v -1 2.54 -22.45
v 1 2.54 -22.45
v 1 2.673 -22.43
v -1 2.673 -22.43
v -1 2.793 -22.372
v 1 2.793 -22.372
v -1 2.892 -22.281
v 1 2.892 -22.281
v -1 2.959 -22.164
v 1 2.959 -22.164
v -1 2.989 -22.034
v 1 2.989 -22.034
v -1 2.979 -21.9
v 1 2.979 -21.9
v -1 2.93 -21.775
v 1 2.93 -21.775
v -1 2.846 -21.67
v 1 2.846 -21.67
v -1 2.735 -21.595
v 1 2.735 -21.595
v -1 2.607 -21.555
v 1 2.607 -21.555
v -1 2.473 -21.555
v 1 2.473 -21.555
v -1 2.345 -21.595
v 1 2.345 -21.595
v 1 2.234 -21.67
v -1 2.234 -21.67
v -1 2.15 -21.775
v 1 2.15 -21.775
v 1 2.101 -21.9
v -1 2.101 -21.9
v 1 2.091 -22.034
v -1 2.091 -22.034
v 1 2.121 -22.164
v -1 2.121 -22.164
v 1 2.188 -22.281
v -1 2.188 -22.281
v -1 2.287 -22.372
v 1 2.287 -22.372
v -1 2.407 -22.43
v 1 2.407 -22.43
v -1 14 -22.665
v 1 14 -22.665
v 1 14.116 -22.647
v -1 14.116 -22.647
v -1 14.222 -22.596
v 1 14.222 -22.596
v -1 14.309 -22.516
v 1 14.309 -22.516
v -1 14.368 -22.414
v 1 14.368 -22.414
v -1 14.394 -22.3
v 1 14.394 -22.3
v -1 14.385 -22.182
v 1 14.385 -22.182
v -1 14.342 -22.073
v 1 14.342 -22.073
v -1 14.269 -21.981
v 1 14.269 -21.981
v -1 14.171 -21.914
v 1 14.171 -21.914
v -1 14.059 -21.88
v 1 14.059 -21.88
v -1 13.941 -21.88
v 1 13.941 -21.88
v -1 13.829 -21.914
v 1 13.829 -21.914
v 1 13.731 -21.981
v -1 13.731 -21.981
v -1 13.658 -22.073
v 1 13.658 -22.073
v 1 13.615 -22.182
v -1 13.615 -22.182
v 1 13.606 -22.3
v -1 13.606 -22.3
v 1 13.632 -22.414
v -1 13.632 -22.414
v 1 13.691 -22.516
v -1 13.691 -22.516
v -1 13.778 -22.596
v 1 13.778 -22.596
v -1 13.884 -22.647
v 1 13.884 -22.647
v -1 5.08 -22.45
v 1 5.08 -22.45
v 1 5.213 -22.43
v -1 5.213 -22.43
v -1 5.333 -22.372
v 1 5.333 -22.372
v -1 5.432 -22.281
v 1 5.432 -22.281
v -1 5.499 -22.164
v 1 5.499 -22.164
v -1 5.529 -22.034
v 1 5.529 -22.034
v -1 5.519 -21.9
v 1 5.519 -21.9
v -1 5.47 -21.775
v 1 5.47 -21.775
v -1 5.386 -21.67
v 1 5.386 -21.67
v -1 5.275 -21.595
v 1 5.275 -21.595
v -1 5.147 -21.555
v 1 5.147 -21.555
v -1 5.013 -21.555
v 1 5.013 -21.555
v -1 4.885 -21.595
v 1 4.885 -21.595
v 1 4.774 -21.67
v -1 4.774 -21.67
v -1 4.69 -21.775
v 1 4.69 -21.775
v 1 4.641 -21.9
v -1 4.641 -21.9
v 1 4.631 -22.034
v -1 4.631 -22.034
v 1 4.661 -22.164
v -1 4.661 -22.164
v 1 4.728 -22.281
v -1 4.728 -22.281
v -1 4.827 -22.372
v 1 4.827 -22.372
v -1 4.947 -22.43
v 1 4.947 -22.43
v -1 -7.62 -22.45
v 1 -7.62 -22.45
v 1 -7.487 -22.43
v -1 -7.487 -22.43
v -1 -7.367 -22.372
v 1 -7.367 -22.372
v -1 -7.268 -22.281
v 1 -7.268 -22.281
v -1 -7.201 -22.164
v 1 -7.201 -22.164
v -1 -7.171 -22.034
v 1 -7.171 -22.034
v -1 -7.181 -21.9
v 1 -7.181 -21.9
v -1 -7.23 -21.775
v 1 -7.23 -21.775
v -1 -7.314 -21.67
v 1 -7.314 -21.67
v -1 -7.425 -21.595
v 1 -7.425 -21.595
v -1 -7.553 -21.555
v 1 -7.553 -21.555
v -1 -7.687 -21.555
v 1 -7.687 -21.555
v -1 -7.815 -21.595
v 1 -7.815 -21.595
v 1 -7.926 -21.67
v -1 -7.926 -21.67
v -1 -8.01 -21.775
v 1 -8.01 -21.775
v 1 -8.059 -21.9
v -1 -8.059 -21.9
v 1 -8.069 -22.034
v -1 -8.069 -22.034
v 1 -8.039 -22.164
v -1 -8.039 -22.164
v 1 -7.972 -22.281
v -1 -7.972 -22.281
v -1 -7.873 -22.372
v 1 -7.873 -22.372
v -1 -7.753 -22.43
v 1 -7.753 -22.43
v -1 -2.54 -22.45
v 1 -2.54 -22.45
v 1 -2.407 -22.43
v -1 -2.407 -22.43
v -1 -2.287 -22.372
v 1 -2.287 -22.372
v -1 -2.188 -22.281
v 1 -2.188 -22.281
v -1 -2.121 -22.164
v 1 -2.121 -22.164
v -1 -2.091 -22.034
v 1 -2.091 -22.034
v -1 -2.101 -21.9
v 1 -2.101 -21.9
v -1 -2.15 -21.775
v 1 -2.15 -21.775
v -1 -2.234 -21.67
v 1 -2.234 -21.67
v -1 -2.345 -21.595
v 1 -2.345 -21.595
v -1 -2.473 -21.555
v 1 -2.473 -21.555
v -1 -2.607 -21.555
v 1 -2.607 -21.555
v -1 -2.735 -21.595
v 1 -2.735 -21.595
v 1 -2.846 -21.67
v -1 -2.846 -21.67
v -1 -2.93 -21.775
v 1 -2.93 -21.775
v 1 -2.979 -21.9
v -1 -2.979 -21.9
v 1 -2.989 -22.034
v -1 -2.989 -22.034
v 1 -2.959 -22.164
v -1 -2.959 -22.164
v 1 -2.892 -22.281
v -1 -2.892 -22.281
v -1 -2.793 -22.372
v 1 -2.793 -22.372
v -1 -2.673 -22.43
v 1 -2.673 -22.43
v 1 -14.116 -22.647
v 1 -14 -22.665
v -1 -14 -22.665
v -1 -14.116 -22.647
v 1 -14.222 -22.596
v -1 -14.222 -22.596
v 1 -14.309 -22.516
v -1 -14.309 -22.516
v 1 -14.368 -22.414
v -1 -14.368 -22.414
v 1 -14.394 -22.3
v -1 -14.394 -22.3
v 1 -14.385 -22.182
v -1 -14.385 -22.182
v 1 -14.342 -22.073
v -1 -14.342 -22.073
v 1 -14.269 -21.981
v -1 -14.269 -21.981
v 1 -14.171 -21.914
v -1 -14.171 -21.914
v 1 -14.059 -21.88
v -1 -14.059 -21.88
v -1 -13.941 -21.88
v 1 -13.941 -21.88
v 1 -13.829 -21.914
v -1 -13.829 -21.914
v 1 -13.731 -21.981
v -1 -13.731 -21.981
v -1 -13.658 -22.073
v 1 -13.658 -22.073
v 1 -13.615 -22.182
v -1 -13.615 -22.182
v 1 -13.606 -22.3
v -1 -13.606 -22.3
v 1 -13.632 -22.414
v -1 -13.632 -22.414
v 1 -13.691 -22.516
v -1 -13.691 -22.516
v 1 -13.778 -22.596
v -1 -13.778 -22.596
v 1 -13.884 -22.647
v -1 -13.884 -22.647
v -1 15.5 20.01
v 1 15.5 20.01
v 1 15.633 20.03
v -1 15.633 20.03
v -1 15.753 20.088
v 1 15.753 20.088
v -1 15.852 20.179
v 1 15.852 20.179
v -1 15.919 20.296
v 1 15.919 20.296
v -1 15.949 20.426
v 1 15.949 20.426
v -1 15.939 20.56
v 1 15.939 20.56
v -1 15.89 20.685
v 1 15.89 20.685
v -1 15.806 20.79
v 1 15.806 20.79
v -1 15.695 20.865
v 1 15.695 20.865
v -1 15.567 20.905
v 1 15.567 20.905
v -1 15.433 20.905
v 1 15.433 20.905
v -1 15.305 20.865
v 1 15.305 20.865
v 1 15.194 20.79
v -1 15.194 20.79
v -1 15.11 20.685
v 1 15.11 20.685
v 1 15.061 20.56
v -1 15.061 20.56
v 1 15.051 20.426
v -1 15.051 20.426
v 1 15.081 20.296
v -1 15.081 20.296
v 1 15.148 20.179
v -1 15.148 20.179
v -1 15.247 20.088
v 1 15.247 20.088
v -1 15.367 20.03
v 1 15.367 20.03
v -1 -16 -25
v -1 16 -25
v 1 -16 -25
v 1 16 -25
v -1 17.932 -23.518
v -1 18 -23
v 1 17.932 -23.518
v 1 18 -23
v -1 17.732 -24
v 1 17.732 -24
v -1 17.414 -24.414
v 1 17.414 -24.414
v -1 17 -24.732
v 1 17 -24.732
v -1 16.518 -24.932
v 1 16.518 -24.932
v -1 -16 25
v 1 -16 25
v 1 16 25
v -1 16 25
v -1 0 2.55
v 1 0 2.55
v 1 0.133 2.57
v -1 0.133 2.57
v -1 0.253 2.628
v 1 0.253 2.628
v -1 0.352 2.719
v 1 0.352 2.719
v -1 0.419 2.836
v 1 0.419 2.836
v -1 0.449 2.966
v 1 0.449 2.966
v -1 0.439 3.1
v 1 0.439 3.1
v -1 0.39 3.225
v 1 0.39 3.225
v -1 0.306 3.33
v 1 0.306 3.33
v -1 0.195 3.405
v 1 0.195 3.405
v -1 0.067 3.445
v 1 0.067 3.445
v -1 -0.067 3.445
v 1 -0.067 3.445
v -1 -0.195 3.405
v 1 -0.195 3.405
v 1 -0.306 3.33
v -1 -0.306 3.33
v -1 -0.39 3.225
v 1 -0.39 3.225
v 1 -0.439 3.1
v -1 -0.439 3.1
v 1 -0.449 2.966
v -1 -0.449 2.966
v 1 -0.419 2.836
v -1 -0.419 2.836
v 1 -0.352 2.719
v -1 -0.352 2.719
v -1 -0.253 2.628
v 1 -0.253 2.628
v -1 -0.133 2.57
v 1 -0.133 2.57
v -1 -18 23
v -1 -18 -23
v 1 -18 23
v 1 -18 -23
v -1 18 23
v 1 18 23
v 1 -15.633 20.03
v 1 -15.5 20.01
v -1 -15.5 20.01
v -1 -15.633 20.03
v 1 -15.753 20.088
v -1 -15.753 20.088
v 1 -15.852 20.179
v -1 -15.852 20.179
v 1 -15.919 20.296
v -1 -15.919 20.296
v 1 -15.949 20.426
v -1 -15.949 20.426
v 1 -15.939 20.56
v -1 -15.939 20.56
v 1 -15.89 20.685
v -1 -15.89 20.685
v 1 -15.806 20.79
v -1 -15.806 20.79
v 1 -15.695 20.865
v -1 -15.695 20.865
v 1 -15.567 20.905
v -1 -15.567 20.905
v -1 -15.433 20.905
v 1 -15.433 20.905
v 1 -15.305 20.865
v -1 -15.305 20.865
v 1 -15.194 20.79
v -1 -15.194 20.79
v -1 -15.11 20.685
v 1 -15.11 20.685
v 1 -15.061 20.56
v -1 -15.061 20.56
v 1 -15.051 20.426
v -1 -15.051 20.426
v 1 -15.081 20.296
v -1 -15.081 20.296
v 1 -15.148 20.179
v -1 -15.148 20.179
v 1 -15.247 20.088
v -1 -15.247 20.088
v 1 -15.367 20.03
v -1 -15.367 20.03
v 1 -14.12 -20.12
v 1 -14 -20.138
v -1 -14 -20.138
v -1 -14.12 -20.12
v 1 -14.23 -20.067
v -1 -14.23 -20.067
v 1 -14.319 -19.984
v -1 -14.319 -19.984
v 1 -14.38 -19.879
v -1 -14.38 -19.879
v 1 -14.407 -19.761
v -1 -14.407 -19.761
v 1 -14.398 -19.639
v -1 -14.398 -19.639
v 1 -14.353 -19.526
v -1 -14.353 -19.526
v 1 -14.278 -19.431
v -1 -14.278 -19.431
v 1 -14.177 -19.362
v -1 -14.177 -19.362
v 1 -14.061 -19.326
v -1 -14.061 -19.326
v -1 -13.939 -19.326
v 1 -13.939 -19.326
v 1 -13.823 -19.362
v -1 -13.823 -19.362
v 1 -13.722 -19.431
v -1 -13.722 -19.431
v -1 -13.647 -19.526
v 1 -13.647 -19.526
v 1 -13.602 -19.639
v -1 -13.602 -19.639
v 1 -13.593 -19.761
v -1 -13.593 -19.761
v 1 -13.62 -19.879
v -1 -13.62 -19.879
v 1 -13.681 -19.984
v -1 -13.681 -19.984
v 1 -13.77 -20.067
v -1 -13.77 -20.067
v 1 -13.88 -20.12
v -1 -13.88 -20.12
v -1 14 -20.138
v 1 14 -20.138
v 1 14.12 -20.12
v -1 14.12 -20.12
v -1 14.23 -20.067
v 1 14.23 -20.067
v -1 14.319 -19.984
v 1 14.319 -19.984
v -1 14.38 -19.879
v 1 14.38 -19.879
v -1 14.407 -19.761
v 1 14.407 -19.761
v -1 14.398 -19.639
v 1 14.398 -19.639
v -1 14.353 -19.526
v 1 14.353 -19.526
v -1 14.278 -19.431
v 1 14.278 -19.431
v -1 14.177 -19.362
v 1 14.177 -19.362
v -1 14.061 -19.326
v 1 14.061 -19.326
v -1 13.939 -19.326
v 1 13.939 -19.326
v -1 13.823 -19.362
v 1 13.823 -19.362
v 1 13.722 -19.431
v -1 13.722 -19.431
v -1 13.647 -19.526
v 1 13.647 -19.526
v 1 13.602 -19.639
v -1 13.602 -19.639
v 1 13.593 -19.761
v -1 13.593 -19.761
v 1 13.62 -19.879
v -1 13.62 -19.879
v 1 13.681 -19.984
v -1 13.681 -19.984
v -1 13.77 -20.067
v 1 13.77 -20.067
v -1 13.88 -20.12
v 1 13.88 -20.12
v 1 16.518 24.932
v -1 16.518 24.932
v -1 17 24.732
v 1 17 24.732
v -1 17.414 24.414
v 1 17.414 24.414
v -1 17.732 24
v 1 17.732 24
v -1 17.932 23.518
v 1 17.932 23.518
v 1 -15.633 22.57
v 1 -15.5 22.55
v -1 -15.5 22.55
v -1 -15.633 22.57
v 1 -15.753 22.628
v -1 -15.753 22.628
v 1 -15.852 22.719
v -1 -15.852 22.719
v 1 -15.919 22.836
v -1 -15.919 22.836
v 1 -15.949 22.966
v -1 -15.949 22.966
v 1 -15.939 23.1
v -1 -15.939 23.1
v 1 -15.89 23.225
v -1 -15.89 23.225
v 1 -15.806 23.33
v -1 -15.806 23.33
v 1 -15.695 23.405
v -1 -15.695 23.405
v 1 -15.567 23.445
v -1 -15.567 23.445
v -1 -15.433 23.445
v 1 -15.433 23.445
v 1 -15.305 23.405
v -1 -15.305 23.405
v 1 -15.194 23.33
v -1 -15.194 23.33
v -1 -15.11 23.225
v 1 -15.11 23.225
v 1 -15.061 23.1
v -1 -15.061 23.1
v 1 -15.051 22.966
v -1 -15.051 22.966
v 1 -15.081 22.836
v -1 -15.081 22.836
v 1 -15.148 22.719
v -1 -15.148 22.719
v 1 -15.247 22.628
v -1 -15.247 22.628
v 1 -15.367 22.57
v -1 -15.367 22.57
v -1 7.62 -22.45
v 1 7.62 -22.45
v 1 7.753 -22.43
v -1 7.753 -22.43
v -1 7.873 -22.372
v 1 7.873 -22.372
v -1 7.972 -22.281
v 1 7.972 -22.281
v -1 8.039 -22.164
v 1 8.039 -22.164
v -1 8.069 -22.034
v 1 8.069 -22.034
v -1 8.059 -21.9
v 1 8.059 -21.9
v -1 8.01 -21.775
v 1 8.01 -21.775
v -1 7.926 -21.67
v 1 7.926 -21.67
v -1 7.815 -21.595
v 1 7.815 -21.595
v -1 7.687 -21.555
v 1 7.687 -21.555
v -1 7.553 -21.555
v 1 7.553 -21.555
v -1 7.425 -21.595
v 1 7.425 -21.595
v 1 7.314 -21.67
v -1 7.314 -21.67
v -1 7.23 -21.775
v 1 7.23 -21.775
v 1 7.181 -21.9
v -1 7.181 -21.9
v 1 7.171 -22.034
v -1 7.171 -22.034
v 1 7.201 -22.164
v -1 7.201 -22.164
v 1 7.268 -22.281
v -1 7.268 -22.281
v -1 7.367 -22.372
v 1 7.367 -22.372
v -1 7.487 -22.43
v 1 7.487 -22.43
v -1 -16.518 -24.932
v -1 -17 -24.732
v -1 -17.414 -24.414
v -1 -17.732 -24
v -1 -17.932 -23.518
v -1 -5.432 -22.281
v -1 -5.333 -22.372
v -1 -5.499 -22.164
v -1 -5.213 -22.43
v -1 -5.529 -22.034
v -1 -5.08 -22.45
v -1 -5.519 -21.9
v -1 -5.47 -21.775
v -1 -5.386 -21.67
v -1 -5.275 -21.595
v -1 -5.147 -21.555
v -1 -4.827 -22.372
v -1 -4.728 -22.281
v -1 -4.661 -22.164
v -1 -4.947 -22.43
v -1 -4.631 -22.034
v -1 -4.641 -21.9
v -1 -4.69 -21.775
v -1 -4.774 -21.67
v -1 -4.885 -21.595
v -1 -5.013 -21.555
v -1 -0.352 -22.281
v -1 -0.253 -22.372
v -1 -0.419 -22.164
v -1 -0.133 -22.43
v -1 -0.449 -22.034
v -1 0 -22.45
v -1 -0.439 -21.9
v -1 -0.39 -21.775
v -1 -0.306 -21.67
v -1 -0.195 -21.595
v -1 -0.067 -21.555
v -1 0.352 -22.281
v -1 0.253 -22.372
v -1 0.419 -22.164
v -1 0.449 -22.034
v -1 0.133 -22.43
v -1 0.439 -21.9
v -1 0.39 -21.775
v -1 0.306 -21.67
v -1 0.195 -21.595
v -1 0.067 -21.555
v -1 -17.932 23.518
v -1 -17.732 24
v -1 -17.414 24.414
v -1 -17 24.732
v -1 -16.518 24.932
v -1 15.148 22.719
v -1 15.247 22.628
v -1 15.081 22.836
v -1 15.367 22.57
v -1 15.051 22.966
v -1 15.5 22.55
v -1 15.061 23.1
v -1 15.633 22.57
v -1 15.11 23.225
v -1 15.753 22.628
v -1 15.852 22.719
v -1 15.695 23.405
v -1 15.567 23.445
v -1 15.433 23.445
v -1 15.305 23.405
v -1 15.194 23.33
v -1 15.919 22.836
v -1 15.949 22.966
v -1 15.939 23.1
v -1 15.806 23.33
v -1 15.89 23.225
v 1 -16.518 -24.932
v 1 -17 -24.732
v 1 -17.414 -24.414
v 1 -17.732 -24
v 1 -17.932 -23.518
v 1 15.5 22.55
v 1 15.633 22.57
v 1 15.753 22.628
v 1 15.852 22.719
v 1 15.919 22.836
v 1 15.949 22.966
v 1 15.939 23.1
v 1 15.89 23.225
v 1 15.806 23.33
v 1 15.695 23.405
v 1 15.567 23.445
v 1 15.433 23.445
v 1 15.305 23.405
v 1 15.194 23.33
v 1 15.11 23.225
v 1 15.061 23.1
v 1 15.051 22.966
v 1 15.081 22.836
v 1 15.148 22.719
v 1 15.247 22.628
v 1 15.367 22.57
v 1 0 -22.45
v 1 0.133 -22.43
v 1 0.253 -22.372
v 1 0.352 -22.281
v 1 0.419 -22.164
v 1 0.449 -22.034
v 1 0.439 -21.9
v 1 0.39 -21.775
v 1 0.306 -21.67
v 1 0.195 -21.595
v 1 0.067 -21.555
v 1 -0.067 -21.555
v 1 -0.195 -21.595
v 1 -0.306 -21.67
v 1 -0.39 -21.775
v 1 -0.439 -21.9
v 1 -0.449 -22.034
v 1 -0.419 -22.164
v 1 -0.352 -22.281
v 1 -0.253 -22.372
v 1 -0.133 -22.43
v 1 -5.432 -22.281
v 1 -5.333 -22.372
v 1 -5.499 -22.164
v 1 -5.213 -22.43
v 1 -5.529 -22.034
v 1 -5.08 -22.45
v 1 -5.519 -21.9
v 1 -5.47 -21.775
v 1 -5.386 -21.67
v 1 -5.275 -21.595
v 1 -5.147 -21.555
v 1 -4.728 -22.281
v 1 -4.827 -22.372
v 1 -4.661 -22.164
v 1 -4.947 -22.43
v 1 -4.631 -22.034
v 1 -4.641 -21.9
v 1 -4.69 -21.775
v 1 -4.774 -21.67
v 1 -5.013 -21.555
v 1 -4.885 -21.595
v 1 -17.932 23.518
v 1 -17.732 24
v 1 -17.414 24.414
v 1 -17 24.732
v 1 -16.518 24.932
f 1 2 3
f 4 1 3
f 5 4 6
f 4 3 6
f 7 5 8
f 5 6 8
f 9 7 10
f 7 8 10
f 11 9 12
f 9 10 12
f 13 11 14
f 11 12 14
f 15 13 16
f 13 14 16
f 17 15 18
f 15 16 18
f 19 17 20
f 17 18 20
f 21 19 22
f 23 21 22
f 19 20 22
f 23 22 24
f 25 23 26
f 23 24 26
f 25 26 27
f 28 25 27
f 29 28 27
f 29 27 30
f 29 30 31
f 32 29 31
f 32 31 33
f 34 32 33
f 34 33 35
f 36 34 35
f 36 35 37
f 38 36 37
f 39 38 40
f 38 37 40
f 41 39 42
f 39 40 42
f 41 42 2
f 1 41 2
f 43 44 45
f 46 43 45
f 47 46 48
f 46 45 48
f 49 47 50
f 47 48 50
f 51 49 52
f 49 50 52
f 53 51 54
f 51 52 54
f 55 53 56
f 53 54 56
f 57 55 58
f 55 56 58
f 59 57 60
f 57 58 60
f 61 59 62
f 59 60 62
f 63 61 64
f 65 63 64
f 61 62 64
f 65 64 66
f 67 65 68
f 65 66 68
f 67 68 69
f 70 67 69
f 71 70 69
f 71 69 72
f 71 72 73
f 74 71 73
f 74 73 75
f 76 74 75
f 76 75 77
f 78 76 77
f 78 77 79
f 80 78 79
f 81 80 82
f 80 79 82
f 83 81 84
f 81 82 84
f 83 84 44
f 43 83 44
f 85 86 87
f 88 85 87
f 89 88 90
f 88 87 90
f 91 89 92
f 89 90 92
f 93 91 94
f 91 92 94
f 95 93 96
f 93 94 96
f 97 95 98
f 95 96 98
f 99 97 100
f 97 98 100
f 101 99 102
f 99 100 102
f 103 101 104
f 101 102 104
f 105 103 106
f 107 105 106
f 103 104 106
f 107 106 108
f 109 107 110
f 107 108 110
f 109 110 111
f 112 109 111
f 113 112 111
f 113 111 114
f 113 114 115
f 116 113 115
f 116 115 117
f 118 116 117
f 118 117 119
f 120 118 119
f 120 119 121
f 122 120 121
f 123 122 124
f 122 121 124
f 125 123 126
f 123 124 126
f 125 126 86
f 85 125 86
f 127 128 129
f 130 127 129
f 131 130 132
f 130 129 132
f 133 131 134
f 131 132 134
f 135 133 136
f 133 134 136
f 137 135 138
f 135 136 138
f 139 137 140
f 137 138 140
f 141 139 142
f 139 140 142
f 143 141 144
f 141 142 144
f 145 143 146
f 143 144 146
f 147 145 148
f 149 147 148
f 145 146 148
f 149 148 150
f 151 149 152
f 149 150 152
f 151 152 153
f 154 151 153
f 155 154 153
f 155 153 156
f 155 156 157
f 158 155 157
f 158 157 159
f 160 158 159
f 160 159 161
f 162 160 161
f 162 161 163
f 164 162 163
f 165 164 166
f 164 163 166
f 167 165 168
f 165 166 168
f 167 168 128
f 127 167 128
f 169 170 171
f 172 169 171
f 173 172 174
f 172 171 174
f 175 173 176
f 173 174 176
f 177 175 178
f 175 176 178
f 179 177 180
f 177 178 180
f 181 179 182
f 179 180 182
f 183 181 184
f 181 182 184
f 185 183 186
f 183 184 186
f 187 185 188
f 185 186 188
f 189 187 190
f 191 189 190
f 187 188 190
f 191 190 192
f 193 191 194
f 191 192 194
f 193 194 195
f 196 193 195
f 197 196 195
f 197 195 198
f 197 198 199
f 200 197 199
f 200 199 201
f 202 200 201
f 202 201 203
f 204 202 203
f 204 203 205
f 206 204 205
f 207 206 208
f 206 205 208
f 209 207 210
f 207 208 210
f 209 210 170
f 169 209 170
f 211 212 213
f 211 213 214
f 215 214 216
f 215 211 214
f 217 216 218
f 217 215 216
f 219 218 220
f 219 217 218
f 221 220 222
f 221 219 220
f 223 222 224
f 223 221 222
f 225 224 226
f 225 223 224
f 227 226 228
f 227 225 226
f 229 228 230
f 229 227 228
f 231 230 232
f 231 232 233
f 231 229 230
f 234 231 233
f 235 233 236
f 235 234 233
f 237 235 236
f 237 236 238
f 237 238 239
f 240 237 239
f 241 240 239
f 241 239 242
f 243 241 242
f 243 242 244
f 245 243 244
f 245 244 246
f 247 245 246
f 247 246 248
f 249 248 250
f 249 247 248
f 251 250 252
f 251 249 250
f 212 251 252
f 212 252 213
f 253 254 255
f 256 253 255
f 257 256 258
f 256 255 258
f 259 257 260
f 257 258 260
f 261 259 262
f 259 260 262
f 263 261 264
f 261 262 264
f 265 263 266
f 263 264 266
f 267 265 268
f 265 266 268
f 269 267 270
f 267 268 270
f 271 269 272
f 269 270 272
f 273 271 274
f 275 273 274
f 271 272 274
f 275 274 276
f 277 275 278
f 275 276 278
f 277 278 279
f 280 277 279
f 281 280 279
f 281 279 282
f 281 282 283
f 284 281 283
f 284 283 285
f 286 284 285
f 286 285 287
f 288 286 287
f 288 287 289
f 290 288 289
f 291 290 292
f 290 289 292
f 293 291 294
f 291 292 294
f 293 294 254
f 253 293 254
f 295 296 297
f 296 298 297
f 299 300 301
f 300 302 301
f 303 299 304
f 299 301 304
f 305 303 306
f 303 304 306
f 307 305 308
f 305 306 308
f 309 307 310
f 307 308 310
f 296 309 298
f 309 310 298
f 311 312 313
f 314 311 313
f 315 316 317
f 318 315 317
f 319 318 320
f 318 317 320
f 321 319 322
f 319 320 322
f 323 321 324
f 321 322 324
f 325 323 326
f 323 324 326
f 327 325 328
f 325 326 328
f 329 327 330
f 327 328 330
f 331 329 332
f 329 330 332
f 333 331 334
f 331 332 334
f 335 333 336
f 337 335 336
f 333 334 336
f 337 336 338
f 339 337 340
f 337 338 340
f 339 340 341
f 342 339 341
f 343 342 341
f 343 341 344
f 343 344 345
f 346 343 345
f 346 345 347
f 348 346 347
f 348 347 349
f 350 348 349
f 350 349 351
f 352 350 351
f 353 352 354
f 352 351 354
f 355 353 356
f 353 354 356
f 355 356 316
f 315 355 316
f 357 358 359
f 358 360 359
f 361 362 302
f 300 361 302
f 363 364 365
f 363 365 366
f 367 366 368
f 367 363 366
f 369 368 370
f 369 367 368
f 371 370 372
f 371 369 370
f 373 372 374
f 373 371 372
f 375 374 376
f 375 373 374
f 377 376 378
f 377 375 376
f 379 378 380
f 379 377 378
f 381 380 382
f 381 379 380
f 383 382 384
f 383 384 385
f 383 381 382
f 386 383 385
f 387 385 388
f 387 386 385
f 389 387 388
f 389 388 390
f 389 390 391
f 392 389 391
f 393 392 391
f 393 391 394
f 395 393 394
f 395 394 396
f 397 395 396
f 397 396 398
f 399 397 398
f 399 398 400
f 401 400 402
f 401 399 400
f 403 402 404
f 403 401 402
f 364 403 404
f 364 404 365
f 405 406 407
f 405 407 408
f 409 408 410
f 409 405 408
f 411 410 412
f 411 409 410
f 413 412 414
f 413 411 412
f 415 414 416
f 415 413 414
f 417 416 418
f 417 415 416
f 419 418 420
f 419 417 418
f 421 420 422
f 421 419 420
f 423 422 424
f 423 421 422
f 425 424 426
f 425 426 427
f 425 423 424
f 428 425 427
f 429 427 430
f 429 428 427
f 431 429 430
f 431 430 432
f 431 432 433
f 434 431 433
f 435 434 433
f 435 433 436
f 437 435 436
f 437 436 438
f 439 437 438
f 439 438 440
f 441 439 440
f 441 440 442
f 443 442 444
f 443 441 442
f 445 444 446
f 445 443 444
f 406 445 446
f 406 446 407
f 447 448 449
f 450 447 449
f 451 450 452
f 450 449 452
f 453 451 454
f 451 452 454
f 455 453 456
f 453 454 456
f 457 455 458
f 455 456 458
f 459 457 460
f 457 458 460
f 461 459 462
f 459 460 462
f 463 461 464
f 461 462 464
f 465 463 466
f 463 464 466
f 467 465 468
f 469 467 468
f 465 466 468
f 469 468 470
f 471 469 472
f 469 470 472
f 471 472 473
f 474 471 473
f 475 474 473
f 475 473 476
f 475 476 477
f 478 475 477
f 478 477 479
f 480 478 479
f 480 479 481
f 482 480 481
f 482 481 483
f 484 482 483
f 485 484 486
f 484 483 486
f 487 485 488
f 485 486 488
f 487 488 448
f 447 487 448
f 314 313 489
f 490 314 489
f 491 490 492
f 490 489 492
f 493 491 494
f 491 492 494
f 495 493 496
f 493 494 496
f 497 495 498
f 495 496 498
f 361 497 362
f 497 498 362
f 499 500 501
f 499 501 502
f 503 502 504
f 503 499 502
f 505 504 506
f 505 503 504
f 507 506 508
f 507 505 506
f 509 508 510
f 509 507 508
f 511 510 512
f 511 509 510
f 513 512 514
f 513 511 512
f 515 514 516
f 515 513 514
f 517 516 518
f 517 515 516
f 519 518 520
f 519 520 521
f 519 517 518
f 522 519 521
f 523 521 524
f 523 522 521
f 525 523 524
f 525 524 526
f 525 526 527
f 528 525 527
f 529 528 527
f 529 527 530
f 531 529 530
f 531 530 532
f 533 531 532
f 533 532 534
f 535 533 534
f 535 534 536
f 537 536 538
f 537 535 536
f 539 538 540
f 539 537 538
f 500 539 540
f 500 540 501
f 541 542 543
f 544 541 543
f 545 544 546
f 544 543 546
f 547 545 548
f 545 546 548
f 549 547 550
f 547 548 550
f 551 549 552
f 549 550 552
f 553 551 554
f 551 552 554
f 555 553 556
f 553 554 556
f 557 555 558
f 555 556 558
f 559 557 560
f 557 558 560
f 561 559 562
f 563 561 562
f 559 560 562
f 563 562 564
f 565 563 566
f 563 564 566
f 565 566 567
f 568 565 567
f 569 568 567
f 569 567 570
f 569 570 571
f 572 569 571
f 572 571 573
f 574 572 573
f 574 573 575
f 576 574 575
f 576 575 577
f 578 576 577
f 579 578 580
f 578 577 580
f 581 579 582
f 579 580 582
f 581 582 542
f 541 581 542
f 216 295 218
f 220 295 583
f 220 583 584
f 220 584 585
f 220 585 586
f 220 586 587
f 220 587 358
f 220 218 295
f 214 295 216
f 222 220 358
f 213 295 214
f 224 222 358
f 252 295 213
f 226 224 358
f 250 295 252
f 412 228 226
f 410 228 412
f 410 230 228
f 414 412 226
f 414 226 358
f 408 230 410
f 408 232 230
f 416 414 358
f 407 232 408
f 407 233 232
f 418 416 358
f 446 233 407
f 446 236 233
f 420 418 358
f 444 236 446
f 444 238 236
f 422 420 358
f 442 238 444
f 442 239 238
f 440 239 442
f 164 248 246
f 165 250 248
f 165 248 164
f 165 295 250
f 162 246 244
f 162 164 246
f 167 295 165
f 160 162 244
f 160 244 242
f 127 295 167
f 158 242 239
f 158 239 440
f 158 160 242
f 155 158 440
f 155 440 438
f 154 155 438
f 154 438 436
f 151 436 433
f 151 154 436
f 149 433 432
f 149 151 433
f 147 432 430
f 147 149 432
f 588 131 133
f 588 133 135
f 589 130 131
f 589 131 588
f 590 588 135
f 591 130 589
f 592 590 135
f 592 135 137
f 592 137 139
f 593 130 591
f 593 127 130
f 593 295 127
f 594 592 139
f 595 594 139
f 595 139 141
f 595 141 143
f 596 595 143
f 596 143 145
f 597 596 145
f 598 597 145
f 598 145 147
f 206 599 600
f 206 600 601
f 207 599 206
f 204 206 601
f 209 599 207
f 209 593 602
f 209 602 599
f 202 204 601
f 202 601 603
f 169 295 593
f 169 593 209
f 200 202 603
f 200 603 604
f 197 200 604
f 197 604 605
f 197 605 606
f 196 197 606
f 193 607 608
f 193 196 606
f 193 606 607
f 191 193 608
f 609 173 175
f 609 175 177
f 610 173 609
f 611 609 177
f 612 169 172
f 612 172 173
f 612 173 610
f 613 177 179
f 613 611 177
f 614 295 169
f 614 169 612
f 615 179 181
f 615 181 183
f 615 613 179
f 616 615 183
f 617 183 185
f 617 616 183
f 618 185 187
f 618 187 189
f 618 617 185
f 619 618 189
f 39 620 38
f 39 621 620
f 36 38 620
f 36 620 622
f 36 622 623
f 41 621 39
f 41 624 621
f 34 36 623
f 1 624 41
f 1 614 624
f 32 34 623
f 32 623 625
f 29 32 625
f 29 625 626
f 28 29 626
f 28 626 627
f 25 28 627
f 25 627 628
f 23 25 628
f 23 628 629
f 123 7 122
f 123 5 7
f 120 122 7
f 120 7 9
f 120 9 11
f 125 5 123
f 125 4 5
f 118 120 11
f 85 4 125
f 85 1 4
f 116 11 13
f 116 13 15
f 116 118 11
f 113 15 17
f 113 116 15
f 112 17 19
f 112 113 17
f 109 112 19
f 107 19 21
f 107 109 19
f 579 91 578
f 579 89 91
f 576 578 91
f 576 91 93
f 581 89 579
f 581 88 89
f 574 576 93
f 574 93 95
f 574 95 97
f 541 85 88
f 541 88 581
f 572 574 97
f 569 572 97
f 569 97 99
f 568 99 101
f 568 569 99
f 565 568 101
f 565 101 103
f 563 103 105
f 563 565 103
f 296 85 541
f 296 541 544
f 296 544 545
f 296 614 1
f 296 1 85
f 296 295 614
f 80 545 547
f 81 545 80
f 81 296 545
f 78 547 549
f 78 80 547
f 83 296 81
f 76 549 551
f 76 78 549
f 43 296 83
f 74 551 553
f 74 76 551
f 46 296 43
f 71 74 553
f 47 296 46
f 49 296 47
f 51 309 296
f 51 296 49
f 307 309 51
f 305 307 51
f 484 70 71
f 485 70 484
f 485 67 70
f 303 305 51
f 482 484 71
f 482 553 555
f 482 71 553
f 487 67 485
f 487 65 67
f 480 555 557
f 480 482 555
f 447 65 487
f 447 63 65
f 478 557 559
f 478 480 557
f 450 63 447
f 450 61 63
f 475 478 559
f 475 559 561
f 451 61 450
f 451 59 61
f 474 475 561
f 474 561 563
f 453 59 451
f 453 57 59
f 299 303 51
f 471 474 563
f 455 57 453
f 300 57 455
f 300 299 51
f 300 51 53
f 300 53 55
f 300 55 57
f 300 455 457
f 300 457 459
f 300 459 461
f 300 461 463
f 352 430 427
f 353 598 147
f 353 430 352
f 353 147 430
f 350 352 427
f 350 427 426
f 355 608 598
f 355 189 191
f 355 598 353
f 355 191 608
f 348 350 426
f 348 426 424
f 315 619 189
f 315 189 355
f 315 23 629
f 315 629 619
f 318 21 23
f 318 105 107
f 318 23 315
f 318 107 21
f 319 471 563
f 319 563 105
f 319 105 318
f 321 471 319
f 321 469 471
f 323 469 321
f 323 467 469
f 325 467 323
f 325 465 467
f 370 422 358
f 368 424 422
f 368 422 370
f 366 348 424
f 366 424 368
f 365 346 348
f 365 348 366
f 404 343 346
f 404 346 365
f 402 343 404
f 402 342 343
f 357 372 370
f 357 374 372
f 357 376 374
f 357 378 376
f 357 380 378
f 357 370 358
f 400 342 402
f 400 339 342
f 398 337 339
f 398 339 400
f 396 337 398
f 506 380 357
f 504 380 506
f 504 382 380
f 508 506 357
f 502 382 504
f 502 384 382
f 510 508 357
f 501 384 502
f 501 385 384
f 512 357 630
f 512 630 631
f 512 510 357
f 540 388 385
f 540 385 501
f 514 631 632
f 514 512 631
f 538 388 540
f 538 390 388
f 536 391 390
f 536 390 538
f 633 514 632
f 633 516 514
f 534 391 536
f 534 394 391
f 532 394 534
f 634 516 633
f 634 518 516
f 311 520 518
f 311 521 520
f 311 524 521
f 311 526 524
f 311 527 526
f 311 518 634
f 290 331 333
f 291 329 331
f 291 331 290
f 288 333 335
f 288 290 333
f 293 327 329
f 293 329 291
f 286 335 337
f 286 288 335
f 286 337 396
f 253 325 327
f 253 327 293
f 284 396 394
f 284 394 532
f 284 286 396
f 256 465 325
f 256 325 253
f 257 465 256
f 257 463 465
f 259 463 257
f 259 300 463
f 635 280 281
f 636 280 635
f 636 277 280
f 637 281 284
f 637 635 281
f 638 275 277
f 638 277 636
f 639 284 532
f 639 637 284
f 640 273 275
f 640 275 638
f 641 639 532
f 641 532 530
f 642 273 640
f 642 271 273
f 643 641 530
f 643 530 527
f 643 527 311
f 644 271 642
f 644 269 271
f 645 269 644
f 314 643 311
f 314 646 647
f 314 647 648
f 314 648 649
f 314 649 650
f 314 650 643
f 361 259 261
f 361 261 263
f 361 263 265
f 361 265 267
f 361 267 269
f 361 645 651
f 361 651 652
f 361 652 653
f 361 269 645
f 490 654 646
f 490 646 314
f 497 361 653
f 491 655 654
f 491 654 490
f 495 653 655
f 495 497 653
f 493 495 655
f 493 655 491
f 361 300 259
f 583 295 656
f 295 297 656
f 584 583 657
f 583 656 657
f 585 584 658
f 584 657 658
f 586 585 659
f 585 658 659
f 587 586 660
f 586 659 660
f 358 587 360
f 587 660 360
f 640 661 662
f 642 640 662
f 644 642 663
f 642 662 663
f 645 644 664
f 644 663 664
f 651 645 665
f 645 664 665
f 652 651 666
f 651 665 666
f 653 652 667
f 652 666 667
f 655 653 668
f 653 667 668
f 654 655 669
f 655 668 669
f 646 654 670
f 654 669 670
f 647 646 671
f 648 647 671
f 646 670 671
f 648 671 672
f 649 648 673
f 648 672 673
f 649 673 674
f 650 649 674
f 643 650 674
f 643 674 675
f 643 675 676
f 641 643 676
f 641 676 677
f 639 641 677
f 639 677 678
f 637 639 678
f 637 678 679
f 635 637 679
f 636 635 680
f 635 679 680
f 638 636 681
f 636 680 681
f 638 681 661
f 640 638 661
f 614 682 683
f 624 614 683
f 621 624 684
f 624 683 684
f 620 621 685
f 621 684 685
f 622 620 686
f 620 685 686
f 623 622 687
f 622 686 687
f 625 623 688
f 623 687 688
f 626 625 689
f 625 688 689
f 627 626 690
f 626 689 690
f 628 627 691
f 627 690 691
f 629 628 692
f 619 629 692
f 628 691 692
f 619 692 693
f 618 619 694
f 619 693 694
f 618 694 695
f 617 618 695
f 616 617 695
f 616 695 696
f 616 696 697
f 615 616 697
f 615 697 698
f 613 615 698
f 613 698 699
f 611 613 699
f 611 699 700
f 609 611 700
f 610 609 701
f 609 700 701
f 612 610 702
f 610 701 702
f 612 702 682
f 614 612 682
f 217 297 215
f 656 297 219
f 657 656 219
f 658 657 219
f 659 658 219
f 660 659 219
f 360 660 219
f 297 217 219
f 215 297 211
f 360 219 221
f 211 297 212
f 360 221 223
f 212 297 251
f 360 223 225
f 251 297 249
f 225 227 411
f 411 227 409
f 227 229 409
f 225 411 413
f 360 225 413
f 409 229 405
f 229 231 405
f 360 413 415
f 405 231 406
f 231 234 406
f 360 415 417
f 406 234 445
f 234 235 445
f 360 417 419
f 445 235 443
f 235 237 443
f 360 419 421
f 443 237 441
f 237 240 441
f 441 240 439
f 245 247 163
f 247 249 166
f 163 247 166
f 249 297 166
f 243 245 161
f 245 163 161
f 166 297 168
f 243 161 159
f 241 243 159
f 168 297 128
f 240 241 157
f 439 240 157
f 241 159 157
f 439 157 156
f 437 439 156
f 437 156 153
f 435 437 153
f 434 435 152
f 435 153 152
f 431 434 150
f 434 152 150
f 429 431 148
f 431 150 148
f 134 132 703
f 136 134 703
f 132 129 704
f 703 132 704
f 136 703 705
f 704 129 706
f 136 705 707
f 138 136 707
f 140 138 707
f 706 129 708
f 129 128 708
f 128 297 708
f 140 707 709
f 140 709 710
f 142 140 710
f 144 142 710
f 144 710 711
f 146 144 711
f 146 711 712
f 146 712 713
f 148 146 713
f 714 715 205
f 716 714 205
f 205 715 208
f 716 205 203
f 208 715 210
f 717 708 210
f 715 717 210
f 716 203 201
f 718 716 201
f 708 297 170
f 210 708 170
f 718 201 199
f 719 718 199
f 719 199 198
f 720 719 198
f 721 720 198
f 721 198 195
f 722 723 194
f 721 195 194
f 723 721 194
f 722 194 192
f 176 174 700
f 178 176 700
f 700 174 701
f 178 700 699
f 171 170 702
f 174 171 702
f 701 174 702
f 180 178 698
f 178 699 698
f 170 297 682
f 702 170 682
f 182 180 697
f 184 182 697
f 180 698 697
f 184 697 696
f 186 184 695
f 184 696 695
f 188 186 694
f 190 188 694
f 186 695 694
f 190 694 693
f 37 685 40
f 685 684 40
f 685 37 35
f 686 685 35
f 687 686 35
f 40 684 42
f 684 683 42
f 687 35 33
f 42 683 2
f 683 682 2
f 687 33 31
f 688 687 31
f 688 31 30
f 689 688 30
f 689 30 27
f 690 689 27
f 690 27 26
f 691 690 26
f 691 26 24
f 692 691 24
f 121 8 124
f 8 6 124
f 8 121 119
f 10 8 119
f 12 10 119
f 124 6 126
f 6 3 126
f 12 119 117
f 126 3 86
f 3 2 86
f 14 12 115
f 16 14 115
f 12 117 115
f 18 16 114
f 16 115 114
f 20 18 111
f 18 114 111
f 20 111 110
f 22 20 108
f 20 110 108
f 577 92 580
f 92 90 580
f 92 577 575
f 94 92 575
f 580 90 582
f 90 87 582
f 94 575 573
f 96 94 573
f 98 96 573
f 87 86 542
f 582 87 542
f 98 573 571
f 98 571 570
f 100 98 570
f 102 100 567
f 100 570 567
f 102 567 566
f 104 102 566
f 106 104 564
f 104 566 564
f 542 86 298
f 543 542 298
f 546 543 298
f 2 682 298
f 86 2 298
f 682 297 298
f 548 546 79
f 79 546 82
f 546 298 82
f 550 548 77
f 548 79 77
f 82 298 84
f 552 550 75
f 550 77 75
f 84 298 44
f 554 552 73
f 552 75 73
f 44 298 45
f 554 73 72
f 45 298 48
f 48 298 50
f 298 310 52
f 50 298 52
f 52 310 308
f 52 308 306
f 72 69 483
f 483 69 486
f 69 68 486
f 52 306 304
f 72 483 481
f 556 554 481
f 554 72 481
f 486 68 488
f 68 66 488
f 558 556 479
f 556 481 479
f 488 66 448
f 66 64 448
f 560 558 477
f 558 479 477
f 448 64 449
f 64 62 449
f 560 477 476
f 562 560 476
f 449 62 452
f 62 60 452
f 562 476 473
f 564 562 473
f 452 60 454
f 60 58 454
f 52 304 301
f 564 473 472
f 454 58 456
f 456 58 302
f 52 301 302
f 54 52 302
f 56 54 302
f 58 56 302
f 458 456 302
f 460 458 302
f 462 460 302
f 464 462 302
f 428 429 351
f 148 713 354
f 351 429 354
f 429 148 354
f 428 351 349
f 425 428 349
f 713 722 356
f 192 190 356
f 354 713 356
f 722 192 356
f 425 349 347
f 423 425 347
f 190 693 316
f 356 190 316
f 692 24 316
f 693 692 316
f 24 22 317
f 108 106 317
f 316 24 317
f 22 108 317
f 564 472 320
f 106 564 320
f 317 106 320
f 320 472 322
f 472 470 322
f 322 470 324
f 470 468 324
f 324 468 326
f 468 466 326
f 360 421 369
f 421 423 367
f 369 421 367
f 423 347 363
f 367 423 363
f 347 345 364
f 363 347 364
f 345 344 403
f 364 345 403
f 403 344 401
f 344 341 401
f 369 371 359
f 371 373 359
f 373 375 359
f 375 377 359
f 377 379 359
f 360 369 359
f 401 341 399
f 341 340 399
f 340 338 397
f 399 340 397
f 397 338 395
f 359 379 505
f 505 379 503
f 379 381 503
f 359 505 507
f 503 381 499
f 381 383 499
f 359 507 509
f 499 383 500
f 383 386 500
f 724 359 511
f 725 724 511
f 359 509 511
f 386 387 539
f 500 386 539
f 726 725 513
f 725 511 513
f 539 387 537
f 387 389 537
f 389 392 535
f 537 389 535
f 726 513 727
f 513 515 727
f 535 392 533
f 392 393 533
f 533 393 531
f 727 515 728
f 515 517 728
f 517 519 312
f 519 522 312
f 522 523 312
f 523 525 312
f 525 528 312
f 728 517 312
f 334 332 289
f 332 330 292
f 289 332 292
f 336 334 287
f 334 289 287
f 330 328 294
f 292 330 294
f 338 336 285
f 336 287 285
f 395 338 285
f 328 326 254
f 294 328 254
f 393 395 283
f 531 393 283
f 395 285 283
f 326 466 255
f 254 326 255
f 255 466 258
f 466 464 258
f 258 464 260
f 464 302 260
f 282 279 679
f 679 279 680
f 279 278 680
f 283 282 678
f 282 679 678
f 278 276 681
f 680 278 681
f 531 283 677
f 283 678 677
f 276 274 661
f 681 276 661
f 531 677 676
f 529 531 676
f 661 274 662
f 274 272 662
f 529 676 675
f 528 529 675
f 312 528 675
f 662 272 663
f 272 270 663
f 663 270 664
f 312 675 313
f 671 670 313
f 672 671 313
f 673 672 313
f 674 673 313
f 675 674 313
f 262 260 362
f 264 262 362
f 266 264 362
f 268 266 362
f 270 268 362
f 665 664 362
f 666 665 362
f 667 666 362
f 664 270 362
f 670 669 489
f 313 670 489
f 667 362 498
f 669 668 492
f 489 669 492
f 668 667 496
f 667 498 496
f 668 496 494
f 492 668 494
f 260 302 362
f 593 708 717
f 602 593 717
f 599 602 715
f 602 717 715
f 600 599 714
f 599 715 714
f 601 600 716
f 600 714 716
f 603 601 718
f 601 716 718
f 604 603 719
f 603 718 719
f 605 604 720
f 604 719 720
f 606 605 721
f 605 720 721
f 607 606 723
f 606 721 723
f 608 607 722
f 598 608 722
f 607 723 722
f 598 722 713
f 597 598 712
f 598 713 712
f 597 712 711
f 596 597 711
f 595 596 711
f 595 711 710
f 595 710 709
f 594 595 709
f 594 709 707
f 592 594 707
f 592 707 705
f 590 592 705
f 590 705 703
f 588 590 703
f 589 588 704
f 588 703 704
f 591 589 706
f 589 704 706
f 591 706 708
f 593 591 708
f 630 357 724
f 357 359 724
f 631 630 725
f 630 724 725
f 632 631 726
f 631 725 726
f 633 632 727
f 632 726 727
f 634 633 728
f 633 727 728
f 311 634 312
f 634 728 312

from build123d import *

# Parameters (mm, degrees)
EXTRUDE_1_DEPTH        = 1
SKETCH_2_R             = 0.45
CUT_EXTRUDE_1_DEPTH    = 2
SKETCH_3_R             = 0.45
CUT_EXTRUDE_2_DEPTH    = 2
PATTERN_LINEAR_1_COUNT = 7
PATTERN_LINEAR_1_PITCH = 2.54
SKETCH_4_R             = 0.45
CUT_EXTRUDE_3_DEPTH    = 2
SKETCH_5_R             = 0.39487869
SKETCH_5_R_2           = 0.408155613
CUT_EXTRUDE_4_DEPTH    = 2


with BuildPart() as part:
    # 草图1 → 凸台-拉伸1 (new, symmetric)
    with BuildSketch(Plane(origin=(0, 0, 0), x_dir=(0, 0, -1), z_dir=(1, 0, 0))):
        with BuildLine():
            Line((-23, 18), (23, 18))
            ThreePointArc((23, 18), (24.414213562, 17.414213562), (25, 16))
            Line((25, 16), (25, -16))
            ThreePointArc((25, -16), (24.414213562, -17.414213562), (23, -18))
            Line((23, -18), (-23, -18))
            ThreePointArc((-23, -18), (-24.414213562, -17.414213562), (-25, -16))
            Line((-25, -16), (-25, 16))
            ThreePointArc((-25, 16), (-24.414213562, 17.414213562), (-23, 18))
        make_face()
    extrude(amount=EXTRUDE_1_DEPTH, both=True)

    # 草图2 → 切除-拉伸1 (cut)
    with BuildSketch(Plane(origin=(1, 0, 0), x_dir=(0, 0, -1), z_dir=(1, 0, 0))):
        with Locations((-23, 15.5)):
            Circle(SKETCH_2_R)
        with Locations((-20.46, 15.5)):
            Circle(SKETCH_2_R)
    cut_extrude_1 = extrude(amount=-CUT_EXTRUDE_1_DEPTH, mode=Mode.SUBTRACT)

    # 镜向1: 切除-拉伸1 across plane
    add(cut_extrude_1.mirror(Plane.ZX), mode=Mode.SUBTRACT)

    # 草图3 → 切除-拉伸2 (cut)
    with BuildSketch(Plane(origin=(1, 0, 0), x_dir=(0, 0, -1), z_dir=(1, 0, 0))):
        with Locations((22, 7.62)):
            Circle(SKETCH_3_R)
    cut_extrude_2 = extrude(amount=-CUT_EXTRUDE_2_DEPTH, mode=Mode.SUBTRACT)

    # 阵列(线性)1: 切除-拉伸2 ×7
    with Locations(*[(0, -i * PATTERN_LINEAR_1_PITCH, 0) for i in range(1, PATTERN_LINEAR_1_COUNT)]):
        add(cut_extrude_2, mode=Mode.SUBTRACT)

    # 草图4 → 切除-拉伸3 (cut)
    with BuildSketch(Plane(origin=(1, 0, 0), x_dir=(0, 0, -1), z_dir=(1, 0, 0))):
        with Locations((-3, 0)):
            Circle(SKETCH_4_R)
    extrude(amount=-CUT_EXTRUDE_3_DEPTH, mode=Mode.SUBTRACT)

    # 草图5 → 切除-拉伸4 (cut)
    with BuildSketch(Plane(origin=(1, 0, 0), x_dir=(0, 0, -1), z_dir=(1, 0, 0))):
        with Locations((22.27, 14)):
            Circle(SKETCH_5_R)
        with Locations((19.73, 14)):
            Circle(SKETCH_5_R_2)
    cut_extrude_4 = extrude(amount=-CUT_EXTRUDE_4_DEPTH, mode=Mode.SUBTRACT)

    # 镜向2: 切除-拉伸4 across plane
    add(cut_extrude_4.mirror(Plane.ZX), mode=Mode.SUBTRACT)


solid = part.part
